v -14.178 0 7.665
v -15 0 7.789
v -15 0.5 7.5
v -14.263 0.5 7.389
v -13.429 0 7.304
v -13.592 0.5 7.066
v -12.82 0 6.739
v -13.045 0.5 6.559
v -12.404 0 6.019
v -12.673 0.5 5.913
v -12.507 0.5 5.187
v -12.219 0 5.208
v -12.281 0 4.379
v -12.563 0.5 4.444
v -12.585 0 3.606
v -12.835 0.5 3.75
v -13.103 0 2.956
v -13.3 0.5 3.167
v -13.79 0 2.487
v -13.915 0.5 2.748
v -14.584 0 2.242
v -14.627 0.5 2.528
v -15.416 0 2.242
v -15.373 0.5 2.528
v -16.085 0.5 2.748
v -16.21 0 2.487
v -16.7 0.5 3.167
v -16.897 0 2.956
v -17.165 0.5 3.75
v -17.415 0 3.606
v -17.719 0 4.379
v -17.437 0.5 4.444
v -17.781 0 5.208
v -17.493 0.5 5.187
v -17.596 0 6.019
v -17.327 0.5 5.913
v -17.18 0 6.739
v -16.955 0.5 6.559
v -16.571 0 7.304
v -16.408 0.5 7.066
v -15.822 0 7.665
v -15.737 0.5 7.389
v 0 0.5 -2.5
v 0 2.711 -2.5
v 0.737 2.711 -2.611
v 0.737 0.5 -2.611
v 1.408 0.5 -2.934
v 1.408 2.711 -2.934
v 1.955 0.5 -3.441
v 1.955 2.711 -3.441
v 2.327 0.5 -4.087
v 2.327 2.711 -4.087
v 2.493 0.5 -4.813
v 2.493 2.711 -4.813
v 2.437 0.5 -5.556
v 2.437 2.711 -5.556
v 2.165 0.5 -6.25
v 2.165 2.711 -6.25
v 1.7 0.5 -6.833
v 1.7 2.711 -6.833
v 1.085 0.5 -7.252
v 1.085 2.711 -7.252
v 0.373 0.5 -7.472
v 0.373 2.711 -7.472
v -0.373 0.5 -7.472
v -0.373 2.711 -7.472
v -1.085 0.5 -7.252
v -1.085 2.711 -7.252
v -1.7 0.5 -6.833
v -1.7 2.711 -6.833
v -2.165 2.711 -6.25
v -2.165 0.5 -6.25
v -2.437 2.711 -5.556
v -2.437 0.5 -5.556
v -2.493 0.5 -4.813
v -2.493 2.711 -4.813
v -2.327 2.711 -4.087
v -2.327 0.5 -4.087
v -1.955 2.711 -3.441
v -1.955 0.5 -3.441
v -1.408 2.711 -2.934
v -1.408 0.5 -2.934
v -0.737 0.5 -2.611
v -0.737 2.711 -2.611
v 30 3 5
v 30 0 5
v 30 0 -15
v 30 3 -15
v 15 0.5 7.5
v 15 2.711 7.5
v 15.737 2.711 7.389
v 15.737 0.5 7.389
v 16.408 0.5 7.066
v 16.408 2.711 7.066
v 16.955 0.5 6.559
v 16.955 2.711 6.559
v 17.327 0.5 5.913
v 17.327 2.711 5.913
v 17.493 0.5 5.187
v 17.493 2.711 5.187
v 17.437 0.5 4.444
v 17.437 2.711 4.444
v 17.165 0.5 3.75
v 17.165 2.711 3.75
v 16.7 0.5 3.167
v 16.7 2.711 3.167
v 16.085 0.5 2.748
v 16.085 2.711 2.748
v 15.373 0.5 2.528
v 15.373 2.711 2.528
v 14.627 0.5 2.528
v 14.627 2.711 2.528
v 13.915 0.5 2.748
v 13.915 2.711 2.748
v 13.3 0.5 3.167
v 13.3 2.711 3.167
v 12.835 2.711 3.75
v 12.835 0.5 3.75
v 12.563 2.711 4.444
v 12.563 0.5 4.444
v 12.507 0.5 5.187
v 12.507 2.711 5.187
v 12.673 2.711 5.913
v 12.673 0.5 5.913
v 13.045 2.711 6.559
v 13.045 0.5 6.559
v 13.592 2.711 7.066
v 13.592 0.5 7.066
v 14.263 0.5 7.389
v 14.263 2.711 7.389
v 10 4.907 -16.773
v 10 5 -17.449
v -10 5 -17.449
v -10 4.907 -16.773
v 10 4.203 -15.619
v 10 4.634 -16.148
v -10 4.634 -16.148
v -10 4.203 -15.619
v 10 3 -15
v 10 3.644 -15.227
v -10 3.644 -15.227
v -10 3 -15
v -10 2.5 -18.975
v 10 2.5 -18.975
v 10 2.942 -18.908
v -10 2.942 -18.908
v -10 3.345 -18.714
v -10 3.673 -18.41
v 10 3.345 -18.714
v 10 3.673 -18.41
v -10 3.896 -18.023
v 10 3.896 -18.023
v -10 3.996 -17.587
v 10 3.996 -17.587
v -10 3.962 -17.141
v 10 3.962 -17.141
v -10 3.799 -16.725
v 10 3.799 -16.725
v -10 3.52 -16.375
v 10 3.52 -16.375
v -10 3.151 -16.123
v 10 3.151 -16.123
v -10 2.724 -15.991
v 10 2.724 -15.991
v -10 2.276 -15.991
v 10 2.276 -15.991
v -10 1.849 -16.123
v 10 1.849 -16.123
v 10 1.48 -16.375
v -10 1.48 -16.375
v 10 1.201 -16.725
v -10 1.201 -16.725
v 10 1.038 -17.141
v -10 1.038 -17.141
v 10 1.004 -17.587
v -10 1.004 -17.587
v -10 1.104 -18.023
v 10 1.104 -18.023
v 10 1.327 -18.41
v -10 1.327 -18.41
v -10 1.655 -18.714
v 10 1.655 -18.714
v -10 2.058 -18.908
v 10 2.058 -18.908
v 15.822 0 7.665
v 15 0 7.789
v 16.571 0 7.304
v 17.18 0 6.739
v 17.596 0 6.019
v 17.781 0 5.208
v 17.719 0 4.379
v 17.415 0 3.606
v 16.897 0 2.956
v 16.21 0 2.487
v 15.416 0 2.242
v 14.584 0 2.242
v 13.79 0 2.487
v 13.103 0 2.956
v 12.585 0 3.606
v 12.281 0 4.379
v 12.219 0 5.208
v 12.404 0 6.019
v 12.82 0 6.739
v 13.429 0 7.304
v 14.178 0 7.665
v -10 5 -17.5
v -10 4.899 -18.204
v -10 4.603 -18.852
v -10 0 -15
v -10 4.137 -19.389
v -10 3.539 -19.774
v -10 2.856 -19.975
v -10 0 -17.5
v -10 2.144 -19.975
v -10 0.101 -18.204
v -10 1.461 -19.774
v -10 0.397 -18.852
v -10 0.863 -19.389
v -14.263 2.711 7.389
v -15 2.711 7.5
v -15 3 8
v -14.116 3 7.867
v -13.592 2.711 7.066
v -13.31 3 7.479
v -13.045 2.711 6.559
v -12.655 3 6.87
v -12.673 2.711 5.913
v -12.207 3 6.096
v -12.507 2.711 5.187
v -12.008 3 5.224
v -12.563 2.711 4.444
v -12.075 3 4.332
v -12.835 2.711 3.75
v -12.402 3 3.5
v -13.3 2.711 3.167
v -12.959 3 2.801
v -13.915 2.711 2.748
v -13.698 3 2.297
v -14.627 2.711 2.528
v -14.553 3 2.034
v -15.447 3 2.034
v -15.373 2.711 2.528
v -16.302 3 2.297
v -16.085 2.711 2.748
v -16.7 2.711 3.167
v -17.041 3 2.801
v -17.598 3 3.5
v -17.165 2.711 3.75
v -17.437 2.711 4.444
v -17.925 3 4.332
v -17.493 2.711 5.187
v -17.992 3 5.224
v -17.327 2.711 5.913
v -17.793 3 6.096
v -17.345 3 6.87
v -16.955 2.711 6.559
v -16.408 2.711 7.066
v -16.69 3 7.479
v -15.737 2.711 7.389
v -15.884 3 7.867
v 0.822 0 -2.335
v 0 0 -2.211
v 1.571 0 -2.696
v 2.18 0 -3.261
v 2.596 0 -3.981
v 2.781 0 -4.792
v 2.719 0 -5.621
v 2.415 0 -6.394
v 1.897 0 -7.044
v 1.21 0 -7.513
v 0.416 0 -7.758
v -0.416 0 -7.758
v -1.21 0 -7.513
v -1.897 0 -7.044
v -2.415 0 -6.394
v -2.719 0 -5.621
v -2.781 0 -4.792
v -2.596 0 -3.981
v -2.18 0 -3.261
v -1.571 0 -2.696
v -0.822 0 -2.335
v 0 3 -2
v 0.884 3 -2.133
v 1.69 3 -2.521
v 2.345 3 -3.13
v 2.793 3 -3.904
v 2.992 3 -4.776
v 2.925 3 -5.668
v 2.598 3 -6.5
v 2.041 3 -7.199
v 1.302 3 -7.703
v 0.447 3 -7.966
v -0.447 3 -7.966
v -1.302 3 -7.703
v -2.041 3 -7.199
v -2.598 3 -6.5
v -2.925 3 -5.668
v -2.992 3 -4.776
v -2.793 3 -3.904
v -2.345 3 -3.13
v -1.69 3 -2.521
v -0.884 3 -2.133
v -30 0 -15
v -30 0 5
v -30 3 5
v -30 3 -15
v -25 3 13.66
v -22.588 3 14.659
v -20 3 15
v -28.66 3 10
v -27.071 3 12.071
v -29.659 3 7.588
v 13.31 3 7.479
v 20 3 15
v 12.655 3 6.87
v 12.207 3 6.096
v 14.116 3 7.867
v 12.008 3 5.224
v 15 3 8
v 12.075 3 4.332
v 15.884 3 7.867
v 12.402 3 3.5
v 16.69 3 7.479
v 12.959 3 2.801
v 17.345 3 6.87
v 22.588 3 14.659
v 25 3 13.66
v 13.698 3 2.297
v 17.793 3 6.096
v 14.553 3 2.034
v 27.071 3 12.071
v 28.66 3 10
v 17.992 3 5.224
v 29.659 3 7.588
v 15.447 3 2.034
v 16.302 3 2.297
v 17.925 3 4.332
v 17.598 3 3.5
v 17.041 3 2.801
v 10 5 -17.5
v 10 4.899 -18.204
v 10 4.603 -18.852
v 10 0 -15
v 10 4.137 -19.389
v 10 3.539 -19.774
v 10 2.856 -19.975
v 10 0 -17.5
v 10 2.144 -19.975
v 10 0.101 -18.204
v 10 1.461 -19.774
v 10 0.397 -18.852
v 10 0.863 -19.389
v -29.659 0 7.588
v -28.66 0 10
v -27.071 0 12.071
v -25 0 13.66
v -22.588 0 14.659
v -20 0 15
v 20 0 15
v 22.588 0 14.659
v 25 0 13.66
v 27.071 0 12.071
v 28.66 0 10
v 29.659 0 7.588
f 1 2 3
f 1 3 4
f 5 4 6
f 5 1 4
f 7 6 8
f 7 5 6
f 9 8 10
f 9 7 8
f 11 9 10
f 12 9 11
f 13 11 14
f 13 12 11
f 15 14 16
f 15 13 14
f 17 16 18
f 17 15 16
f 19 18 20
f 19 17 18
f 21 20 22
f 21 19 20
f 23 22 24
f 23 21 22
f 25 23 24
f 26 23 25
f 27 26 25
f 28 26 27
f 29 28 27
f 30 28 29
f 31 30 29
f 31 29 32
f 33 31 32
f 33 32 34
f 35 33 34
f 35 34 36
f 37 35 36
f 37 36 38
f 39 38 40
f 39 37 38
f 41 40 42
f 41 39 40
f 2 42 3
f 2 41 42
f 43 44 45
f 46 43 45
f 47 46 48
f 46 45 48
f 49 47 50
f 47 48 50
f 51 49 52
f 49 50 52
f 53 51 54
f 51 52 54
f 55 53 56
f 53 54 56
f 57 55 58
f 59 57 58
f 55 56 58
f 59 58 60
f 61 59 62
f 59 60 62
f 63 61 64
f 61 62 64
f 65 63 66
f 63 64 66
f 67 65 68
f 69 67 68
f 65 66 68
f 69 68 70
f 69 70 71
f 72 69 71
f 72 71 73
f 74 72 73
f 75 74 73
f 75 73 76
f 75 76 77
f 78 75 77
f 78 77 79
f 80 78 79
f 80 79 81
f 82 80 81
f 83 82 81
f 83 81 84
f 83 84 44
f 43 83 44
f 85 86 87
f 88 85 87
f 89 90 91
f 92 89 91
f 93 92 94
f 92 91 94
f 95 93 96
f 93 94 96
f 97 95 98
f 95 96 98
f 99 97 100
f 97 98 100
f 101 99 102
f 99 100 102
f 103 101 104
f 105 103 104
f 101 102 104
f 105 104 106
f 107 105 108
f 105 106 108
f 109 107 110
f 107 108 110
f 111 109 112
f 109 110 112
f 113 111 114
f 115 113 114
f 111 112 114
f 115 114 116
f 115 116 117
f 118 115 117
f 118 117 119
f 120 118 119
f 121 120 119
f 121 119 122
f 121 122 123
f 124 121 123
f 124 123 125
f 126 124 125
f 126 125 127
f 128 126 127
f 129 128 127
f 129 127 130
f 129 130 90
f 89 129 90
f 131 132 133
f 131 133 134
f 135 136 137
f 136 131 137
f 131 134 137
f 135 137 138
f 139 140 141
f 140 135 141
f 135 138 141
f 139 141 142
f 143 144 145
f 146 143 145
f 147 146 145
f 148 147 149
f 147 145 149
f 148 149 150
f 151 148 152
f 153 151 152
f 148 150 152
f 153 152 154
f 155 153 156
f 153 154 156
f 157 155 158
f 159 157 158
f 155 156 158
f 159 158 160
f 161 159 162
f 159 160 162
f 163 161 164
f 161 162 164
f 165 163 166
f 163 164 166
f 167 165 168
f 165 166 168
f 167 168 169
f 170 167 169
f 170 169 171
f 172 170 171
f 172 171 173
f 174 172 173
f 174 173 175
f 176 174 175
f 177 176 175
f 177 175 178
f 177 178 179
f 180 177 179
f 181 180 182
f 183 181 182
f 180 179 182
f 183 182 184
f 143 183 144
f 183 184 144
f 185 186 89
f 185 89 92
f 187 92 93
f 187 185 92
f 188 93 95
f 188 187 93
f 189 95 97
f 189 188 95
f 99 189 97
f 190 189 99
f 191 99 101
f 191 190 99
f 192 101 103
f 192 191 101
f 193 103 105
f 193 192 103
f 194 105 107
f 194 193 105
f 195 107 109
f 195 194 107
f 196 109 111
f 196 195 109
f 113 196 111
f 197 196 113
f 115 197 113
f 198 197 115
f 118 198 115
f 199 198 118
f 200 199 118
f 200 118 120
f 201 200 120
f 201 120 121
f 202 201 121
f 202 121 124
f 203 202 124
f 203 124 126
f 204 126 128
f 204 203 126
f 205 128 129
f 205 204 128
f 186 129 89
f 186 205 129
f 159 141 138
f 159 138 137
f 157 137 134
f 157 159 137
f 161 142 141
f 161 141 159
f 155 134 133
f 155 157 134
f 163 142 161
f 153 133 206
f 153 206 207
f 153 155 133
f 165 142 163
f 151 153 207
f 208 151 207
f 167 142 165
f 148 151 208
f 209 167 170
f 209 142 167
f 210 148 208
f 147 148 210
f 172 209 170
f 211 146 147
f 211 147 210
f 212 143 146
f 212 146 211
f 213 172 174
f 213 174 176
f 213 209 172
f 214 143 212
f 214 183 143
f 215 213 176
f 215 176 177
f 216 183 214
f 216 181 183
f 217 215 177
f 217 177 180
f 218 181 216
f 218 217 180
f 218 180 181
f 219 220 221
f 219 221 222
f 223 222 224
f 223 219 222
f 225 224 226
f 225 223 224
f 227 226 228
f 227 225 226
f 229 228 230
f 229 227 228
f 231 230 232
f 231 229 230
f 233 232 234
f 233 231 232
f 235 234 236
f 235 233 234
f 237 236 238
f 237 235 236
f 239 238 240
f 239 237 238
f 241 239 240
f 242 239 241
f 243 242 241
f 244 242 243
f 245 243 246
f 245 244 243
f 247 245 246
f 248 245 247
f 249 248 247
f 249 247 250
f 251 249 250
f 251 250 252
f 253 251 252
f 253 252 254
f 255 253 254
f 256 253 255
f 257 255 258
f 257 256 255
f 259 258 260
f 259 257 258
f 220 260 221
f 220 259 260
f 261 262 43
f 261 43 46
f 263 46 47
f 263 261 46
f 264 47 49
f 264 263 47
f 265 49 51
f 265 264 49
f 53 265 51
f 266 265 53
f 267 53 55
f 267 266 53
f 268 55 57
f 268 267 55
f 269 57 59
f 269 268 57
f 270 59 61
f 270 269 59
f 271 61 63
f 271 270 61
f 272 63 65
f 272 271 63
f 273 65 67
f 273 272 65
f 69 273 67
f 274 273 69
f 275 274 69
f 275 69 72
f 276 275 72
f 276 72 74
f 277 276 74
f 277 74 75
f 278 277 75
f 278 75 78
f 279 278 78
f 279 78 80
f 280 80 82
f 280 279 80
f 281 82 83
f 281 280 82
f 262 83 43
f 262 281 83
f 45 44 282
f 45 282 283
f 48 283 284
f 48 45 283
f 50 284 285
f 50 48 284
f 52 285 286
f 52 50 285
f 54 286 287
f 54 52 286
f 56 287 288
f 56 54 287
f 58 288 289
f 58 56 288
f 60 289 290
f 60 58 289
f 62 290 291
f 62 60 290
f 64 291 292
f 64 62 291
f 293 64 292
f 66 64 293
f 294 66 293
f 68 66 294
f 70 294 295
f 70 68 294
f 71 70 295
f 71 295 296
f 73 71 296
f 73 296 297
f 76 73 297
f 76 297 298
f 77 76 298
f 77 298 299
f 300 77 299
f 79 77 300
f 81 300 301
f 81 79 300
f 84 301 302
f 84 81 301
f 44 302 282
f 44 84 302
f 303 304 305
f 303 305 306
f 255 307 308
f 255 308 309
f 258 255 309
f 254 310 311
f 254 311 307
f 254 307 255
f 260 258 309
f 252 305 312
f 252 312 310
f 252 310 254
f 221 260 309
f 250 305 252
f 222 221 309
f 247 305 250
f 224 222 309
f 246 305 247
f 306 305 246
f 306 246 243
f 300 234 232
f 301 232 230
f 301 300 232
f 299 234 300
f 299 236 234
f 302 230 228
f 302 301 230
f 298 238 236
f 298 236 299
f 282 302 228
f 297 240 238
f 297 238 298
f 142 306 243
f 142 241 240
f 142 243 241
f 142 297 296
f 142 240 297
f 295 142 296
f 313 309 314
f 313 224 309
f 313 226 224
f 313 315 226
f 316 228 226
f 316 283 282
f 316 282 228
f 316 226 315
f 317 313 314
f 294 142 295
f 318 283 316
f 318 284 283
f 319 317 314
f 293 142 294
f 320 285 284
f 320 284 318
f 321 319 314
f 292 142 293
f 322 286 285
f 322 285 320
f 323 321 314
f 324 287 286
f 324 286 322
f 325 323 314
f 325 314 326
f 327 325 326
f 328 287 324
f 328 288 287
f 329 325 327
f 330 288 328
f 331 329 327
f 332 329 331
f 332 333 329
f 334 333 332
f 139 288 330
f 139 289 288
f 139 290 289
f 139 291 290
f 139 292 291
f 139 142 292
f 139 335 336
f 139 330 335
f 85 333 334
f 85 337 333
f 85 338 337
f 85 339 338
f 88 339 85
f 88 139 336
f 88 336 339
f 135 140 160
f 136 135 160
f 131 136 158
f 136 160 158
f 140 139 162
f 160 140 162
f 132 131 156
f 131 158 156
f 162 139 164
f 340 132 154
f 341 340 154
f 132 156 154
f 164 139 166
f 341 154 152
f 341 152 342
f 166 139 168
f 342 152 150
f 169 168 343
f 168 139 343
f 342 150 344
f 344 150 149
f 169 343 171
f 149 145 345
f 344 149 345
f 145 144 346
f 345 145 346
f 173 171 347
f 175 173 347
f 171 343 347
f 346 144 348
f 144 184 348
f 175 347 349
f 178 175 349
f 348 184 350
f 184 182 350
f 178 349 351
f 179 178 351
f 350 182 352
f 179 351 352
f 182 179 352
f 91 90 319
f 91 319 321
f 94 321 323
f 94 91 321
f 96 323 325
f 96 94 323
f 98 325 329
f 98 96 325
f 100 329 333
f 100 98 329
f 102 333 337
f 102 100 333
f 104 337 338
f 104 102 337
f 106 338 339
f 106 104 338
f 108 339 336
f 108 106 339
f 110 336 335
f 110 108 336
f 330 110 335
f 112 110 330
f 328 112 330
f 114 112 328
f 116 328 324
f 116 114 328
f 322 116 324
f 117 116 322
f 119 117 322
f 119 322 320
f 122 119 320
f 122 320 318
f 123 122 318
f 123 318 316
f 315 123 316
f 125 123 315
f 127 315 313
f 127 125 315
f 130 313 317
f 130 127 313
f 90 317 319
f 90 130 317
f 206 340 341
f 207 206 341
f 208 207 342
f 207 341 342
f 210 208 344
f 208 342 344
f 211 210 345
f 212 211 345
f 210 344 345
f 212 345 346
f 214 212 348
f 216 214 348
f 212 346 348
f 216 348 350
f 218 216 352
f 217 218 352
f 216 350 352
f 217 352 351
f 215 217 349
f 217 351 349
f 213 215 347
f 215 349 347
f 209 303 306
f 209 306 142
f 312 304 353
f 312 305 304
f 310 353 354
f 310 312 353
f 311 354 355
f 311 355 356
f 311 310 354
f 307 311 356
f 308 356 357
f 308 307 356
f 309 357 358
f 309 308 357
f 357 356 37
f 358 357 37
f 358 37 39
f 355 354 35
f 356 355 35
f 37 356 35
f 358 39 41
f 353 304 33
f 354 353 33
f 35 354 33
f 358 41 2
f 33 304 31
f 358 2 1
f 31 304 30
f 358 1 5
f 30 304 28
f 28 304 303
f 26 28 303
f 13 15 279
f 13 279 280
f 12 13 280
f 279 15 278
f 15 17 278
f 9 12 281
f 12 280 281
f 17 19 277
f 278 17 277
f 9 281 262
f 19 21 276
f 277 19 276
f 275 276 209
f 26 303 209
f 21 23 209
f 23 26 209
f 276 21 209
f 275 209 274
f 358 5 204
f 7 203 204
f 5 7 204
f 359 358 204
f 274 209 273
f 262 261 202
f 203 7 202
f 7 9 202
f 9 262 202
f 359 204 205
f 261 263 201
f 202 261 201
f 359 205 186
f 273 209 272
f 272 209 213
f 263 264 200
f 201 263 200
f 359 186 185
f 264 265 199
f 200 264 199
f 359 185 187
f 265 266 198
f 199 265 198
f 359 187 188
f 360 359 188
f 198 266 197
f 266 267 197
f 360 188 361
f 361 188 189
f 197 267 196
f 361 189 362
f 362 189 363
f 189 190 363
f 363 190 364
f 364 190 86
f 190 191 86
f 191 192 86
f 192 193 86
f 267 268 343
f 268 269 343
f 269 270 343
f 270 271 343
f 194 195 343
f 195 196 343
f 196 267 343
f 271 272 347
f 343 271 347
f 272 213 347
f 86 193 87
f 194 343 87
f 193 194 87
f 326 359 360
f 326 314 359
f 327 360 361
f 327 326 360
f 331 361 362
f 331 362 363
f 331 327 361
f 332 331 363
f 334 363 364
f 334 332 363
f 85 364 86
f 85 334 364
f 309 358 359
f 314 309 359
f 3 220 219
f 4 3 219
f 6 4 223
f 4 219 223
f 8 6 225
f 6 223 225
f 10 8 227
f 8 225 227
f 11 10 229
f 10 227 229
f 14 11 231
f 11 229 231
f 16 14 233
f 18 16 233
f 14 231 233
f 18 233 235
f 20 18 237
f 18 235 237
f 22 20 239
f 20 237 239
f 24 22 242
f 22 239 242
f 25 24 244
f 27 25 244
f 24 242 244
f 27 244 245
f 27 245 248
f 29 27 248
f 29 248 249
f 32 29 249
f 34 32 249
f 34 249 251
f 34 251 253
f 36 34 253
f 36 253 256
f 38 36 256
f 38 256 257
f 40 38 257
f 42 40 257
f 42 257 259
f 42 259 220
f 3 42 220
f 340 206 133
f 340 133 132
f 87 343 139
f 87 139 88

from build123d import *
from OCP.BRepFilletAPI import BRepFilletAPI_MakeChamfer

# Parameters (mm, degrees)
SZKIC1_W                    = 60
SZKIC1_H                    = 30
DODANIE_WYCI_GNI_CIE1_DEPTH = 3
SZKIC2_R                    = 2.5
WYTNIJ_WYCI_GNI_CIE1_DEPTH  = 5
ZAOKR_GLENIE1_R             = 10
SZKIC3_W                    = 20
SZKIC3_H                    = 3
DODANIE_WYCI_GNI_CIE2_DEPTH = 5
SZKIC4_W                    = 20
SZKIC4_H                    = 5
DODANIE_WYCI_GNI_CIE3_DEPTH = 2
ZAOKR_GLENIE2_R             = 2.5
SZKIC5_R                    = 1.5
WYTNIJ_WYCI_GNI_CIE2_DEPTH  = 20
SFAZOWANIE1_SIZE            = 0.5
SFAZOWANIE1_SIZE2           = 0.288675135
SFAZOWANIE2_SIZE            = 0.5
SFAZOWANIE2_SIZE2           = 0.288675135


with BuildPart() as part:
    # Szkic1 → Dodanie-wyciągnięcie1 (new body)
    with BuildSketch(Plane(origin=(0, 0, 0), x_dir=(1, 0, 0), z_dir=(0, 1, 0))):
        Rectangle(SZKIC1_W, SZKIC1_H)
    extrude(amount=DODANIE_WYCI_GNI_CIE1_DEPTH)

    # Szkic2 → Wytnij-wyciągnięcie1 (cut)
    with BuildSketch(Plane(origin=(0, 3, 0), x_dir=(1, 0, 0), z_dir=(0, 1, 0))):
        with Locations(Location((-15, -5, 0), (0, 0, 270))):
            Circle(SZKIC2_R)
        with Locations(Location((15, -5, 0), (0, 0, 270))):
            Circle(SZKIC2_R)
        with Locations(Location((0, 5, 0), (0, 0, 270))):
            Circle(SZKIC2_R)
    extrude(amount=-WYTNIJ_WYCI_GNI_CIE1_DEPTH, mode=Mode.SUBTRACT)

    # Zaokrąglenie1
    zaokr_glenie1_edges = [part.edges().sort_by_distance(p)[0] for p in [
        (30, 1.5, 15),
        (-30, 1.5, 15),
    ]]
    fillet(zaokr_glenie1_edges, radius=ZAOKR_GLENIE1_R)

    # Szkic3 → Dodanie-wyciągnięcie2 (add)
    with BuildSketch(Plane(origin=(0, 0, -15), x_dir=(-1, 0, 0), z_dir=(0, 0, -1))):
        with Locations((0, 1.5)):
            Rectangle(SZKIC3_W, SZKIC3_H)
    extrude(amount=DODANIE_WYCI_GNI_CIE2_DEPTH)

    # Szkic4 → Dodanie-wyciągnięcie3 (add)
    with BuildSketch(Plane(origin=(0, 3, 0), x_dir=(1, 0, 0), z_dir=(0, 1, 0))):
        with Locations((0, 17.5)):
            Rectangle(SZKIC4_W, SZKIC4_H)
    extrude(amount=DODANIE_WYCI_GNI_CIE3_DEPTH)

    # Zaokrąglenie2
    # the kernel refuses this fillet: 2.5 mm, written as the material it takes off along each edge
    with BuildSketch(Plane(origin=(16.25, 0, -20), x_dir=(0, 1, 0), z_dir=(-1, 0, 0)), Plane(origin=(16.25, 5, -20), x_dir=(0, 0, 1), z_dir=(-1, 0, 0))) as zaokr_glenie2_piece_1:
        with BuildLine():
            CenterArc((ZAOKR_GLENIE2_R, -ZAOKR_GLENIE2_R), ZAOKR_GLENIE2_R, 90, 90)
            Line((0, -ZAOKR_GLENIE2_R), (-ZAOKR_GLENIE2_R * 0.02, -ZAOKR_GLENIE2_R))
            Line((-ZAOKR_GLENIE2_R * 0.02, -ZAOKR_GLENIE2_R), (-ZAOKR_GLENIE2_R * 0.02, ZAOKR_GLENIE2_R * 0.02))
            Line((-ZAOKR_GLENIE2_R * 0.02, ZAOKR_GLENIE2_R * 0.02), (ZAOKR_GLENIE2_R, ZAOKR_GLENIE2_R * 0.02))
            Line((ZAOKR_GLENIE2_R, ZAOKR_GLENIE2_R * 0.02), (ZAOKR_GLENIE2_R, 0))
        make_face()
    extrude(amount=32.5, mode=Mode.SUBTRACT)
    with BuildSketch(Plane(origin=(-16.123724357, 5, -15), x_dir=(0, -1.0, -1.666222715356868e-12), z_dir=(1, 0, 0))) as zaokr_glenie2_piece_2:
        with BuildLine():
            CenterArc((2.5, 2.449489743), ZAOKR_GLENIE2_R, 180, 78.463040967)
            Line((0, 2.449489743), (-0.05, 2.449489743))
            Line((-0.05, 2.449489743), (-0.05, 0))
            Line((-0.05, 0), (0, -0.05))
            ThreePointArc((0, -0.05), (1, -0.05), (1.99, -0.048989795))
            Line((1.99, -0.048989795), (2, 0))
        make_face()
    extrude(amount=32.247448714, mode=Mode.SUBTRACT)

    # Szkic5 → Wytnij-wyciągnięcie2 (cut)
    with BuildSketch(Plane(origin=(10, 0, 0), x_dir=(0, 0, -1), z_dir=(1, 0, 0))):
        with Locations((17.474744871, 2.5)):
            Circle(SZKIC5_R)
    extrude(amount=-WYTNIJ_WYCI_GNI_CIE2_DEPTH, mode=Mode.SUBTRACT)

    # Sfazowanie1
    sfazowanie1_edges = [part.edges().sort_by_distance(p)[0] for p in [
        (0, 3, -7.5),
    ]]
    sfazowanie1_side = [part.faces().sort_by_distance(p)[0] for p in [
        (0, 3, -0.380473171),
    ]]
    chamfer(sfazowanie1_edges, length=SFAZOWANIE1_SIZE, length2=SFAZOWANIE1_SIZE2, reference=sfazowanie1_side[0])

    # Sfazowanie2: one chamfer whose edges measure the first distance from different faces: ONE call of the kernel's chamfer builder (chamfer() names one face for all edges)
    sfazowanie2_edges_1 = [part.edges().sort_by_distance(p)[0] for p in [
        (-15, 0, 2.5),
    ]]
    sfazowanie2_side_1 = [part.faces().sort_by_distance(p)[0] for p in [
        (-15, 1.5, 2.5),
    ]]
    sfazowanie2_edges_2 = [part.edges().sort_by_distance(p)[0] for p in [
        (-15, 3, 2.5),
        (15, 3, 2.5),
    ]]
    sfazowanie2_side_2 = [part.faces().sort_by_distance(p)[0] for p in [
        (0, 3, -0.356851383),
    ]]
    sfazowanie2_edges_3 = [part.edges().sort_by_distance(p)[0] for p in [
        (15, 0, 2.5),
    ]]
    sfazowanie2_side_3 = [part.faces().sort_by_distance(p)[0] for p in [
        (15, 1.5, 2.5),
    ]]
    sfazowanie2_edges_4 = [part.edges().sort_by_distance(p)[0] for p in [
        (0, 0, -7.5),
    ]]
    sfazowanie2_side_4 = [part.faces().sort_by_distance(p)[0] for p in [
        (0, 1.355662433, -7.5),
    ]]
    sfazowanie2 = BRepFilletAPI_MakeChamfer(part.part.solid().wrapped)
    for e in sfazowanie2_edges_1:
        sfazowanie2.Add(SFAZOWANIE2_SIZE, SFAZOWANIE2_SIZE2, e.wrapped, sfazowanie2_side_1[0].wrapped)  # the first distance lies on this face
    for e in sfazowanie2_edges_2:
        sfazowanie2.Add(SFAZOWANIE2_SIZE, SFAZOWANIE2_SIZE2, e.wrapped, sfazowanie2_side_2[0].wrapped)  # the first distance lies on this face
    for e in sfazowanie2_edges_3:
        sfazowanie2.Add(SFAZOWANIE2_SIZE, SFAZOWANIE2_SIZE2, e.wrapped, sfazowanie2_side_3[0].wrapped)  # the first distance lies on this face
    for e in sfazowanie2_edges_4:
        sfazowanie2.Add(SFAZOWANIE2_SIZE, SFAZOWANIE2_SIZE2, e.wrapped, sfazowanie2_side_4[0].wrapped)  # the first distance lies on this face
    add(Compound.cast(sfazowanie2.Shape()), mode=Mode.REPLACE)


solid = part.part
